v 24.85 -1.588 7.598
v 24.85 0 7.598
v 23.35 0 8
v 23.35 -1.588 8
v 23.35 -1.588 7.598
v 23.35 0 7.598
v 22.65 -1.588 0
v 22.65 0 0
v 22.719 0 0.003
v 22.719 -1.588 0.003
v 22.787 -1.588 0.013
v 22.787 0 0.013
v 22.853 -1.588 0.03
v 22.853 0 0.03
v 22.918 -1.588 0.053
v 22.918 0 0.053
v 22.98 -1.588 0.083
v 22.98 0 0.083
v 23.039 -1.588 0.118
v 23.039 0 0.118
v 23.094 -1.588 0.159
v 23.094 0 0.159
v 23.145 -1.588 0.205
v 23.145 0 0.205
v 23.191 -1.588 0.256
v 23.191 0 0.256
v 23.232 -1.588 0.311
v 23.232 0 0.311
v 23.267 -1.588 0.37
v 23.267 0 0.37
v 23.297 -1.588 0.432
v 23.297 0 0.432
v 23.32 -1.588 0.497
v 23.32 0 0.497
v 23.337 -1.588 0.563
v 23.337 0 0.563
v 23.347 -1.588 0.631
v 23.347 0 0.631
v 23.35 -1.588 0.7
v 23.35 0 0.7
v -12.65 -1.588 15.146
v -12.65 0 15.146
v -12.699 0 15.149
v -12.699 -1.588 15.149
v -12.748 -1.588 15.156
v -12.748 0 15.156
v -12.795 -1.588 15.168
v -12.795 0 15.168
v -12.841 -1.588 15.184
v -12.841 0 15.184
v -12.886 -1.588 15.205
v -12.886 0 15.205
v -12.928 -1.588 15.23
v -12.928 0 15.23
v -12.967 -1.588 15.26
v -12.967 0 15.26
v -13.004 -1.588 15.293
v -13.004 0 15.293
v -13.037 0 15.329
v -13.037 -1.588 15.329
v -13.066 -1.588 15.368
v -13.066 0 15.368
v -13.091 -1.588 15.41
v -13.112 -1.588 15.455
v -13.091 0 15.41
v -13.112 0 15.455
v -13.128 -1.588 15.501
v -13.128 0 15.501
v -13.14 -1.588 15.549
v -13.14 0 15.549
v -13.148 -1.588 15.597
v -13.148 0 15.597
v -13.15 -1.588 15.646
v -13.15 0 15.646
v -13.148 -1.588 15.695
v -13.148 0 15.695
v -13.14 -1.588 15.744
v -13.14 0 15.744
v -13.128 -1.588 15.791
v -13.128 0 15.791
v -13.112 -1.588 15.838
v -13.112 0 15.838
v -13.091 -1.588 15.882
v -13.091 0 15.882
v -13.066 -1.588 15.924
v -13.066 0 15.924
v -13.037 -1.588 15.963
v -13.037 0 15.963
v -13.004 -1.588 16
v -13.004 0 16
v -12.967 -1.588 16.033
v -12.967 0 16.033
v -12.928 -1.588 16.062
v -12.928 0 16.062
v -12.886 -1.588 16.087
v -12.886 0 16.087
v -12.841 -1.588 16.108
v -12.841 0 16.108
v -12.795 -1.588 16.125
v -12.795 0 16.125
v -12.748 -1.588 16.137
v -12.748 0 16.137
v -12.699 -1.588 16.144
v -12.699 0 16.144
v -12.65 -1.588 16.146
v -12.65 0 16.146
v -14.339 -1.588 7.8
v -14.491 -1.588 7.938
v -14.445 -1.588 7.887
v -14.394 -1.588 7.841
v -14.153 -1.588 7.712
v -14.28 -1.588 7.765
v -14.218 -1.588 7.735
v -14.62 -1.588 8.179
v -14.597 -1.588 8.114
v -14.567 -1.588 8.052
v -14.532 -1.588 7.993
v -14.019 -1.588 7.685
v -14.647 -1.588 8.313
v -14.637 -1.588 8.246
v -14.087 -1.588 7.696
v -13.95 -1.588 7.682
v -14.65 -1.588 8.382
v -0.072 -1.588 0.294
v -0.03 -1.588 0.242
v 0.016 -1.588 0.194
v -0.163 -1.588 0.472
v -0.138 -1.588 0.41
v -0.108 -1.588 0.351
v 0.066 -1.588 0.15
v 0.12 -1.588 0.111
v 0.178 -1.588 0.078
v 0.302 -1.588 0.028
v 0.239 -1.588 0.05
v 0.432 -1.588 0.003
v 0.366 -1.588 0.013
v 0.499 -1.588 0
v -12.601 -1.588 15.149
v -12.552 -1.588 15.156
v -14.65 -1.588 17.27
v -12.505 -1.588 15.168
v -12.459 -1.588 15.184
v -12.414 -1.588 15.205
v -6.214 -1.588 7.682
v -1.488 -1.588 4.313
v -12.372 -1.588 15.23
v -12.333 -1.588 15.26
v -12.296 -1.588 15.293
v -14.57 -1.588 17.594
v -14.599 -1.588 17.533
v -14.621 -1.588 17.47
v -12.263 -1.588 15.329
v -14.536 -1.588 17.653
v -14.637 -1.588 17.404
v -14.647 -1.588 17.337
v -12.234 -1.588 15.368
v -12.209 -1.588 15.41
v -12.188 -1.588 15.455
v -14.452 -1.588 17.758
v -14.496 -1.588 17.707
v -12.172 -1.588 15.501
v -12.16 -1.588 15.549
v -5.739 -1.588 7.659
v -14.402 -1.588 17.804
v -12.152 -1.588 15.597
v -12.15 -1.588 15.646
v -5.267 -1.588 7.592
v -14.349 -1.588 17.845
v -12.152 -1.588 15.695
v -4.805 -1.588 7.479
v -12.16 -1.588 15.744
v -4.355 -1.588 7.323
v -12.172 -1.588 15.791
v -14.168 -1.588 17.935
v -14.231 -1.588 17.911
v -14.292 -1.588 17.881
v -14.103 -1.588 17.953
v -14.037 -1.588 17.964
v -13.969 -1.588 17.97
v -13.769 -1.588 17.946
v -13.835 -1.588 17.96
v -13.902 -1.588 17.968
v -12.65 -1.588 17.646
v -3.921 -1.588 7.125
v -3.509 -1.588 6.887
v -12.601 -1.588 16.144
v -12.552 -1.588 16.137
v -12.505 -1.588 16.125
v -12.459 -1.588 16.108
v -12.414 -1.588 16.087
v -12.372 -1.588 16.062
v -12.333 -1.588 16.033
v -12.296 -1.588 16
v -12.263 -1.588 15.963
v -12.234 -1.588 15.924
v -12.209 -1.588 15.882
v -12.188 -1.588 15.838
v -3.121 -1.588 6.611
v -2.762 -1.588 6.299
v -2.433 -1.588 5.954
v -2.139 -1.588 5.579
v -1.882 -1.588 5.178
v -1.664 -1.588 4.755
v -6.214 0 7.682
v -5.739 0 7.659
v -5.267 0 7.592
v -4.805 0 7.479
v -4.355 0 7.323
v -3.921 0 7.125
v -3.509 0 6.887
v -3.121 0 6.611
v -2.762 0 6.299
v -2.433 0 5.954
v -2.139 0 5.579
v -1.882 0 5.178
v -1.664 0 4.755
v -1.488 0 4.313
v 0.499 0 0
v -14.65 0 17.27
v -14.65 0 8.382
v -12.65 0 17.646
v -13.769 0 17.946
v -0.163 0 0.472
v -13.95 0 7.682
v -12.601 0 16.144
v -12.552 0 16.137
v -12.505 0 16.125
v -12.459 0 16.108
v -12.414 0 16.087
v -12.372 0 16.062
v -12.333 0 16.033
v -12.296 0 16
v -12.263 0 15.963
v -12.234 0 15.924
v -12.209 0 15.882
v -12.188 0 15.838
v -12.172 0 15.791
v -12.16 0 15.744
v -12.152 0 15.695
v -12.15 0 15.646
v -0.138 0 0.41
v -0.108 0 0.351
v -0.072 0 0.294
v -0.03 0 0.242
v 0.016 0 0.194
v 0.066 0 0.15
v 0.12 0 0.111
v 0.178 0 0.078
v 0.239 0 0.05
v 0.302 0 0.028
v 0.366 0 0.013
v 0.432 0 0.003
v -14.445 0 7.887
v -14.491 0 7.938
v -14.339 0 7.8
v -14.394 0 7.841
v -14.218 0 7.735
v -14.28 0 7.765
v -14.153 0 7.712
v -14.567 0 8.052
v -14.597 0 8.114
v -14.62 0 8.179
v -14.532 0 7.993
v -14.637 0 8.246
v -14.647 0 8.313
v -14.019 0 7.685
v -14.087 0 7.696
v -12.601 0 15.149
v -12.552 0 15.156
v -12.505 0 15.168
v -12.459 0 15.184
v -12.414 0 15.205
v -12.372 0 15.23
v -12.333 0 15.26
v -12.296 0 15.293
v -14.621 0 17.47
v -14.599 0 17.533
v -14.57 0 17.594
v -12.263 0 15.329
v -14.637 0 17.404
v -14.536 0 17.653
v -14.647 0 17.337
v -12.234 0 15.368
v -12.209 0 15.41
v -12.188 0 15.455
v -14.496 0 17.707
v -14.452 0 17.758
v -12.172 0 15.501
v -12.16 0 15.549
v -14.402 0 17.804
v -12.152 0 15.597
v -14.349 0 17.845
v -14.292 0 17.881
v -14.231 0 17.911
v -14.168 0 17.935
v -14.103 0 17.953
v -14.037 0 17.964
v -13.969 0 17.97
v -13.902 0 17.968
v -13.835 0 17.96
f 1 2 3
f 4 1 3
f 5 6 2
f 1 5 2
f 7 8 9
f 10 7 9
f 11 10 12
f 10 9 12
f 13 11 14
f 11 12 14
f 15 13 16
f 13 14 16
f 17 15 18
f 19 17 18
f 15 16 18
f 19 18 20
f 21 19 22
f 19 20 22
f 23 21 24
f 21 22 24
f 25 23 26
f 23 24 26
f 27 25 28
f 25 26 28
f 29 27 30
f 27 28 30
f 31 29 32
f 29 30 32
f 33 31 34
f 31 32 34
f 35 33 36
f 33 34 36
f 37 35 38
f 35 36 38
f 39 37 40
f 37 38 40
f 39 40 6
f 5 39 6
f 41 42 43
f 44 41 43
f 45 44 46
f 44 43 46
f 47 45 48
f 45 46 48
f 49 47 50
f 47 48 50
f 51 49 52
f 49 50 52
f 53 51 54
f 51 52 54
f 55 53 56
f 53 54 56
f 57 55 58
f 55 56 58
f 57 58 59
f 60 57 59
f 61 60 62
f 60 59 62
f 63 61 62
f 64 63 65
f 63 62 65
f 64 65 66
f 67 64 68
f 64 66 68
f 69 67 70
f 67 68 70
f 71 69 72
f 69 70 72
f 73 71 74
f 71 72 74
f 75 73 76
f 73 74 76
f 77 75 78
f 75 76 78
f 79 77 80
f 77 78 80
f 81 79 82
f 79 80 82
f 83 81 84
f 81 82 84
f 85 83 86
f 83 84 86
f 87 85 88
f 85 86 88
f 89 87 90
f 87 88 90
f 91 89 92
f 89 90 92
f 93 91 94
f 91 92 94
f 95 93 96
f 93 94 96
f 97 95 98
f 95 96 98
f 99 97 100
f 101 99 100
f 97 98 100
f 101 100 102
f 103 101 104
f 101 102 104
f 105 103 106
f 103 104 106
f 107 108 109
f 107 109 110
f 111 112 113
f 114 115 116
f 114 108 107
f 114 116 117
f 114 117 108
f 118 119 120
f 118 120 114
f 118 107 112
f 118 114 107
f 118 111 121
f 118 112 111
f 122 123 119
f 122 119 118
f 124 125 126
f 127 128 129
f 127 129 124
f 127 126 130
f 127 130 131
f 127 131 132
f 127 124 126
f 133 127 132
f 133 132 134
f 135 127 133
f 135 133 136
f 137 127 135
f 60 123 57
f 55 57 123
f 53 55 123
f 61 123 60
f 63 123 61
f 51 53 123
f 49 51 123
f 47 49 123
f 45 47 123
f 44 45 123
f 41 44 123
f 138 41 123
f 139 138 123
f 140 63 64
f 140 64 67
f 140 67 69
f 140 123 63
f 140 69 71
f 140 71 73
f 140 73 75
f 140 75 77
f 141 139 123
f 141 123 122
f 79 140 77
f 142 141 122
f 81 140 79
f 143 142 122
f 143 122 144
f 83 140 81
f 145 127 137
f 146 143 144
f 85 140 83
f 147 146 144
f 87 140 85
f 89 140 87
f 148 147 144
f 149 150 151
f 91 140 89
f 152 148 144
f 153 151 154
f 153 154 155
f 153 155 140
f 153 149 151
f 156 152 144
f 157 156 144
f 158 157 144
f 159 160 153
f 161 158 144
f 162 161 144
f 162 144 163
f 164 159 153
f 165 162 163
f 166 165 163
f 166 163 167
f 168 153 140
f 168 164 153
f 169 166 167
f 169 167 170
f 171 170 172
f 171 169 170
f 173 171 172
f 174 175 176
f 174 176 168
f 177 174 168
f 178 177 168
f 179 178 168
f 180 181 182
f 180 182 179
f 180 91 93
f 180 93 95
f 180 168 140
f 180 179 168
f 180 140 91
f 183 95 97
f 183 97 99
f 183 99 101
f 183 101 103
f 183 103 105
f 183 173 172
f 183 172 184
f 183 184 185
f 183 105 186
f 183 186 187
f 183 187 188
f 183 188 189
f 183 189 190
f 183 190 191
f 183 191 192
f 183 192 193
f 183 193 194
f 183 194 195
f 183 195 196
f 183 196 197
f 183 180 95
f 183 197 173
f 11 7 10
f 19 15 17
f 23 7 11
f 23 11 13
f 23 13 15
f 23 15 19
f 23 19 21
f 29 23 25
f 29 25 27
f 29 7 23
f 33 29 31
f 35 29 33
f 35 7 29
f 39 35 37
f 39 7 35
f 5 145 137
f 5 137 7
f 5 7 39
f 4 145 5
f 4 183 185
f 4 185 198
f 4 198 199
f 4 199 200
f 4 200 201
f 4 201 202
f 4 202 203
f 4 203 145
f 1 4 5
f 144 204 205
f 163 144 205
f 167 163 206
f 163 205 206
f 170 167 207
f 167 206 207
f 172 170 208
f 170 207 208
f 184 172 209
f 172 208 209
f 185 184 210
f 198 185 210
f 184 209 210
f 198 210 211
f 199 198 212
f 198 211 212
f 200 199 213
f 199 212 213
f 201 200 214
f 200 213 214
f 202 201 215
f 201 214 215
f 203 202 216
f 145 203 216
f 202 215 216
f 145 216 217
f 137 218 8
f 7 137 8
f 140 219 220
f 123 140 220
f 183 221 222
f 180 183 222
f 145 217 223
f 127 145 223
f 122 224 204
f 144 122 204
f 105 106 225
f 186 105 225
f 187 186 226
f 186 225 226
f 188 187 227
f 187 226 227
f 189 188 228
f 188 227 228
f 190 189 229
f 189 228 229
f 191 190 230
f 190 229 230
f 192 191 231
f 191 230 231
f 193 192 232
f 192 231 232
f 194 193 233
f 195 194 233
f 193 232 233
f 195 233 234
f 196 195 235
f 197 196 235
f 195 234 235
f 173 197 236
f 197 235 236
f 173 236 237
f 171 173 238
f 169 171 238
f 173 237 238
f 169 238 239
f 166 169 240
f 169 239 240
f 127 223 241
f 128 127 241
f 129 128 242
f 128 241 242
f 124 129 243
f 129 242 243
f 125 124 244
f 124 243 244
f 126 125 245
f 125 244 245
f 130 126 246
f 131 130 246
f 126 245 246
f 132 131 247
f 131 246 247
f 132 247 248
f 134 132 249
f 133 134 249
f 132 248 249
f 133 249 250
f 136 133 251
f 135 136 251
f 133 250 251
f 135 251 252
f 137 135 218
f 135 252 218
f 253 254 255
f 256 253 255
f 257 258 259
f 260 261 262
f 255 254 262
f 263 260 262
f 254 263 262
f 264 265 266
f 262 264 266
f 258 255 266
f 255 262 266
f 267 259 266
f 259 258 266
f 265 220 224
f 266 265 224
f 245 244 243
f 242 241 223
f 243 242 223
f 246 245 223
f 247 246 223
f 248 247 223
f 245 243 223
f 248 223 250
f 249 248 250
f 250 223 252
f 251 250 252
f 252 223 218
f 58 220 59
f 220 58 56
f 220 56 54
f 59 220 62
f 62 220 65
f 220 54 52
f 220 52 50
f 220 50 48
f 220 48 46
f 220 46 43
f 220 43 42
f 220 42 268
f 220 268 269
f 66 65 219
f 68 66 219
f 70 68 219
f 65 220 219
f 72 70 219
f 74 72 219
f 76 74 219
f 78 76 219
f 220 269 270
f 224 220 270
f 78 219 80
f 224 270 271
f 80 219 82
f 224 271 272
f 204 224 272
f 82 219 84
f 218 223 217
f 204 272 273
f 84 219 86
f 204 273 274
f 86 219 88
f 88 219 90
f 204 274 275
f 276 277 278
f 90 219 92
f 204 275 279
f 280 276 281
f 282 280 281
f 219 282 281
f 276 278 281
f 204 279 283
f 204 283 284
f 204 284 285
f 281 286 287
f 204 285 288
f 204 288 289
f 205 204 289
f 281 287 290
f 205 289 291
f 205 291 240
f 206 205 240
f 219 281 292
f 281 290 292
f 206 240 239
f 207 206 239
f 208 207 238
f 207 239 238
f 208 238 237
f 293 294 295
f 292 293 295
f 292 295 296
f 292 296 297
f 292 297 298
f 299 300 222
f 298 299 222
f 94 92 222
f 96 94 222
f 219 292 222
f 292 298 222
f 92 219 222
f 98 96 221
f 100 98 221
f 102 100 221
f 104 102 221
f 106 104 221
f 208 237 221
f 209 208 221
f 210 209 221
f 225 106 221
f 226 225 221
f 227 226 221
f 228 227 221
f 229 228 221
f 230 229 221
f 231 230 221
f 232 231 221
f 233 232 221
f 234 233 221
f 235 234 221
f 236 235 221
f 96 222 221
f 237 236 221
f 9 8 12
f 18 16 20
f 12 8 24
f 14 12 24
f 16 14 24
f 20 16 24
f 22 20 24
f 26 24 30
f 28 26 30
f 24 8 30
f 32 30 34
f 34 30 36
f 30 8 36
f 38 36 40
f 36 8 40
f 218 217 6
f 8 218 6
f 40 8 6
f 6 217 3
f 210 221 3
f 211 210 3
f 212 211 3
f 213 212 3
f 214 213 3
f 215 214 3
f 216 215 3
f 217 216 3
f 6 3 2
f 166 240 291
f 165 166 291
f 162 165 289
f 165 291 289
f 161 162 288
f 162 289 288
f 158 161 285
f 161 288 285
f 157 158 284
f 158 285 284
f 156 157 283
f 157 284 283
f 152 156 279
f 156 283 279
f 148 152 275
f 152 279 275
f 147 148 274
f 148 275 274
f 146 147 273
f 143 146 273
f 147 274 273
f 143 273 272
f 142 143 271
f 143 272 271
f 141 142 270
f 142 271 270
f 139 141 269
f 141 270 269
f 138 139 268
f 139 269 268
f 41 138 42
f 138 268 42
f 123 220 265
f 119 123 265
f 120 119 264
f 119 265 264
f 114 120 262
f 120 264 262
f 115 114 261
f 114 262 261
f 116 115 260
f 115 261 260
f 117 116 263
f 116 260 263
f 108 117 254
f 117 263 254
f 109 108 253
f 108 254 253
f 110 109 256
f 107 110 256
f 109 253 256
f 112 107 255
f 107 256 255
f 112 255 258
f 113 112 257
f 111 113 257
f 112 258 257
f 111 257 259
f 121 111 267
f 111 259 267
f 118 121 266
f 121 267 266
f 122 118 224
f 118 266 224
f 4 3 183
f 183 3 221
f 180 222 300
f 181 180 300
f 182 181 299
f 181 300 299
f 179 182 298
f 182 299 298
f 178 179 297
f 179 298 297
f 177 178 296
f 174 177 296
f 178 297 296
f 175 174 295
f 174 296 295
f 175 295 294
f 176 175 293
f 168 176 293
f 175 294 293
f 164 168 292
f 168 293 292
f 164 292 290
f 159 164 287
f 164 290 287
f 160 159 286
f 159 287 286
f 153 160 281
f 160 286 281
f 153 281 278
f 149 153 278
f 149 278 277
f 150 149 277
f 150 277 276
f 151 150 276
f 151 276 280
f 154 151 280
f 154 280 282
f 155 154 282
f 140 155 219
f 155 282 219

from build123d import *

# Parameters (mm, degrees)
F1_DEPTH = 1.5875


# Not quite as in the source:
# - a length typed as a fraction of an inch, garbled in the dataset ("3 / 203.2 mm" for 3/8 in), is restored


with BuildPart() as f1:
    # F0 (on Front) → F1 (new body)
    with BuildSketch(Plane.XZ):
        with BuildLine():
            ThreePointArc((-0.162727133, 0.4717287226), (0.0926759109, 0.1300044324), (0.4990071217, 0))
            Line((0.4990071217, 0), (22.65, 0))
            ThreePointArc((22.65, 0), (23.1449747468, 0.2050252532), (23.35, 0.7))
            Line((23.35, 0.7), (23.35, 7.5980762114))
            Line((23.35, 7.5980762114), (23.35, 8))
            Line((23.35, 8), (-12.65, 17.6461709275))
            Line((-12.65, 17.6461709275), (-12.65, 16.1461709275))
            ThreePointArc((-12.65, 16.1461709275), (-12.2964466094, 15.9997243181), (-12.15, 15.6461709275))
            ThreePointArc((-12.15, 15.6461709275), (-12.2964466094, 15.2926175369), (-12.65, 15.1461709275))
            Line((-12.65, 15.1461709275), (-12.65, 7.6820693124))
            Line((-12.65, 7.6820693124), (-6.2143365838, 7.6820693124))
            ThreePointArc((-6.2143365838, 7.6820693124), (-3.311970792, 6.7534662239), (-1.4876633356, 4.3125784367))
            Line((-1.4876633356, 4.3125784367), (-0.162727133, 0.4717287226))
        make_face()
        with BuildLine():
            Line((-13.95, 7.6820693124), (-12.65, 7.6820693124))
            Line((-12.65, 7.6820693124), (-12.65, 15.1461709275))
            ThreePointArc((-12.65, 15.1461709275), (-13.15, 15.6461709275), (-12.65, 16.1461709275))
            Line((-12.65, 16.1461709275), (-12.65, 17.6461709275))
            Line((-12.65, 17.6461709275), (-13.7688266684, 17.9459596298))
            ThreePointArc((-13.7688266684, 17.9459596298), (-14.3761330003, 17.8251588896), (-14.65, 17.2698115514))
            Line((-14.65, 17.2698115514), (-14.65, 8.3820693124))
            ThreePointArc((-14.65, 8.3820693124), (-14.4449747468, 7.8870945656), (-13.95, 7.6820693124))
        make_face()
        Polygon((23.35, 8), (23.35, 7.5980762114), (24.85, 7.5980762114), align=None)
    extrude(amount=F1_DEPTH)


solid = f1.part
